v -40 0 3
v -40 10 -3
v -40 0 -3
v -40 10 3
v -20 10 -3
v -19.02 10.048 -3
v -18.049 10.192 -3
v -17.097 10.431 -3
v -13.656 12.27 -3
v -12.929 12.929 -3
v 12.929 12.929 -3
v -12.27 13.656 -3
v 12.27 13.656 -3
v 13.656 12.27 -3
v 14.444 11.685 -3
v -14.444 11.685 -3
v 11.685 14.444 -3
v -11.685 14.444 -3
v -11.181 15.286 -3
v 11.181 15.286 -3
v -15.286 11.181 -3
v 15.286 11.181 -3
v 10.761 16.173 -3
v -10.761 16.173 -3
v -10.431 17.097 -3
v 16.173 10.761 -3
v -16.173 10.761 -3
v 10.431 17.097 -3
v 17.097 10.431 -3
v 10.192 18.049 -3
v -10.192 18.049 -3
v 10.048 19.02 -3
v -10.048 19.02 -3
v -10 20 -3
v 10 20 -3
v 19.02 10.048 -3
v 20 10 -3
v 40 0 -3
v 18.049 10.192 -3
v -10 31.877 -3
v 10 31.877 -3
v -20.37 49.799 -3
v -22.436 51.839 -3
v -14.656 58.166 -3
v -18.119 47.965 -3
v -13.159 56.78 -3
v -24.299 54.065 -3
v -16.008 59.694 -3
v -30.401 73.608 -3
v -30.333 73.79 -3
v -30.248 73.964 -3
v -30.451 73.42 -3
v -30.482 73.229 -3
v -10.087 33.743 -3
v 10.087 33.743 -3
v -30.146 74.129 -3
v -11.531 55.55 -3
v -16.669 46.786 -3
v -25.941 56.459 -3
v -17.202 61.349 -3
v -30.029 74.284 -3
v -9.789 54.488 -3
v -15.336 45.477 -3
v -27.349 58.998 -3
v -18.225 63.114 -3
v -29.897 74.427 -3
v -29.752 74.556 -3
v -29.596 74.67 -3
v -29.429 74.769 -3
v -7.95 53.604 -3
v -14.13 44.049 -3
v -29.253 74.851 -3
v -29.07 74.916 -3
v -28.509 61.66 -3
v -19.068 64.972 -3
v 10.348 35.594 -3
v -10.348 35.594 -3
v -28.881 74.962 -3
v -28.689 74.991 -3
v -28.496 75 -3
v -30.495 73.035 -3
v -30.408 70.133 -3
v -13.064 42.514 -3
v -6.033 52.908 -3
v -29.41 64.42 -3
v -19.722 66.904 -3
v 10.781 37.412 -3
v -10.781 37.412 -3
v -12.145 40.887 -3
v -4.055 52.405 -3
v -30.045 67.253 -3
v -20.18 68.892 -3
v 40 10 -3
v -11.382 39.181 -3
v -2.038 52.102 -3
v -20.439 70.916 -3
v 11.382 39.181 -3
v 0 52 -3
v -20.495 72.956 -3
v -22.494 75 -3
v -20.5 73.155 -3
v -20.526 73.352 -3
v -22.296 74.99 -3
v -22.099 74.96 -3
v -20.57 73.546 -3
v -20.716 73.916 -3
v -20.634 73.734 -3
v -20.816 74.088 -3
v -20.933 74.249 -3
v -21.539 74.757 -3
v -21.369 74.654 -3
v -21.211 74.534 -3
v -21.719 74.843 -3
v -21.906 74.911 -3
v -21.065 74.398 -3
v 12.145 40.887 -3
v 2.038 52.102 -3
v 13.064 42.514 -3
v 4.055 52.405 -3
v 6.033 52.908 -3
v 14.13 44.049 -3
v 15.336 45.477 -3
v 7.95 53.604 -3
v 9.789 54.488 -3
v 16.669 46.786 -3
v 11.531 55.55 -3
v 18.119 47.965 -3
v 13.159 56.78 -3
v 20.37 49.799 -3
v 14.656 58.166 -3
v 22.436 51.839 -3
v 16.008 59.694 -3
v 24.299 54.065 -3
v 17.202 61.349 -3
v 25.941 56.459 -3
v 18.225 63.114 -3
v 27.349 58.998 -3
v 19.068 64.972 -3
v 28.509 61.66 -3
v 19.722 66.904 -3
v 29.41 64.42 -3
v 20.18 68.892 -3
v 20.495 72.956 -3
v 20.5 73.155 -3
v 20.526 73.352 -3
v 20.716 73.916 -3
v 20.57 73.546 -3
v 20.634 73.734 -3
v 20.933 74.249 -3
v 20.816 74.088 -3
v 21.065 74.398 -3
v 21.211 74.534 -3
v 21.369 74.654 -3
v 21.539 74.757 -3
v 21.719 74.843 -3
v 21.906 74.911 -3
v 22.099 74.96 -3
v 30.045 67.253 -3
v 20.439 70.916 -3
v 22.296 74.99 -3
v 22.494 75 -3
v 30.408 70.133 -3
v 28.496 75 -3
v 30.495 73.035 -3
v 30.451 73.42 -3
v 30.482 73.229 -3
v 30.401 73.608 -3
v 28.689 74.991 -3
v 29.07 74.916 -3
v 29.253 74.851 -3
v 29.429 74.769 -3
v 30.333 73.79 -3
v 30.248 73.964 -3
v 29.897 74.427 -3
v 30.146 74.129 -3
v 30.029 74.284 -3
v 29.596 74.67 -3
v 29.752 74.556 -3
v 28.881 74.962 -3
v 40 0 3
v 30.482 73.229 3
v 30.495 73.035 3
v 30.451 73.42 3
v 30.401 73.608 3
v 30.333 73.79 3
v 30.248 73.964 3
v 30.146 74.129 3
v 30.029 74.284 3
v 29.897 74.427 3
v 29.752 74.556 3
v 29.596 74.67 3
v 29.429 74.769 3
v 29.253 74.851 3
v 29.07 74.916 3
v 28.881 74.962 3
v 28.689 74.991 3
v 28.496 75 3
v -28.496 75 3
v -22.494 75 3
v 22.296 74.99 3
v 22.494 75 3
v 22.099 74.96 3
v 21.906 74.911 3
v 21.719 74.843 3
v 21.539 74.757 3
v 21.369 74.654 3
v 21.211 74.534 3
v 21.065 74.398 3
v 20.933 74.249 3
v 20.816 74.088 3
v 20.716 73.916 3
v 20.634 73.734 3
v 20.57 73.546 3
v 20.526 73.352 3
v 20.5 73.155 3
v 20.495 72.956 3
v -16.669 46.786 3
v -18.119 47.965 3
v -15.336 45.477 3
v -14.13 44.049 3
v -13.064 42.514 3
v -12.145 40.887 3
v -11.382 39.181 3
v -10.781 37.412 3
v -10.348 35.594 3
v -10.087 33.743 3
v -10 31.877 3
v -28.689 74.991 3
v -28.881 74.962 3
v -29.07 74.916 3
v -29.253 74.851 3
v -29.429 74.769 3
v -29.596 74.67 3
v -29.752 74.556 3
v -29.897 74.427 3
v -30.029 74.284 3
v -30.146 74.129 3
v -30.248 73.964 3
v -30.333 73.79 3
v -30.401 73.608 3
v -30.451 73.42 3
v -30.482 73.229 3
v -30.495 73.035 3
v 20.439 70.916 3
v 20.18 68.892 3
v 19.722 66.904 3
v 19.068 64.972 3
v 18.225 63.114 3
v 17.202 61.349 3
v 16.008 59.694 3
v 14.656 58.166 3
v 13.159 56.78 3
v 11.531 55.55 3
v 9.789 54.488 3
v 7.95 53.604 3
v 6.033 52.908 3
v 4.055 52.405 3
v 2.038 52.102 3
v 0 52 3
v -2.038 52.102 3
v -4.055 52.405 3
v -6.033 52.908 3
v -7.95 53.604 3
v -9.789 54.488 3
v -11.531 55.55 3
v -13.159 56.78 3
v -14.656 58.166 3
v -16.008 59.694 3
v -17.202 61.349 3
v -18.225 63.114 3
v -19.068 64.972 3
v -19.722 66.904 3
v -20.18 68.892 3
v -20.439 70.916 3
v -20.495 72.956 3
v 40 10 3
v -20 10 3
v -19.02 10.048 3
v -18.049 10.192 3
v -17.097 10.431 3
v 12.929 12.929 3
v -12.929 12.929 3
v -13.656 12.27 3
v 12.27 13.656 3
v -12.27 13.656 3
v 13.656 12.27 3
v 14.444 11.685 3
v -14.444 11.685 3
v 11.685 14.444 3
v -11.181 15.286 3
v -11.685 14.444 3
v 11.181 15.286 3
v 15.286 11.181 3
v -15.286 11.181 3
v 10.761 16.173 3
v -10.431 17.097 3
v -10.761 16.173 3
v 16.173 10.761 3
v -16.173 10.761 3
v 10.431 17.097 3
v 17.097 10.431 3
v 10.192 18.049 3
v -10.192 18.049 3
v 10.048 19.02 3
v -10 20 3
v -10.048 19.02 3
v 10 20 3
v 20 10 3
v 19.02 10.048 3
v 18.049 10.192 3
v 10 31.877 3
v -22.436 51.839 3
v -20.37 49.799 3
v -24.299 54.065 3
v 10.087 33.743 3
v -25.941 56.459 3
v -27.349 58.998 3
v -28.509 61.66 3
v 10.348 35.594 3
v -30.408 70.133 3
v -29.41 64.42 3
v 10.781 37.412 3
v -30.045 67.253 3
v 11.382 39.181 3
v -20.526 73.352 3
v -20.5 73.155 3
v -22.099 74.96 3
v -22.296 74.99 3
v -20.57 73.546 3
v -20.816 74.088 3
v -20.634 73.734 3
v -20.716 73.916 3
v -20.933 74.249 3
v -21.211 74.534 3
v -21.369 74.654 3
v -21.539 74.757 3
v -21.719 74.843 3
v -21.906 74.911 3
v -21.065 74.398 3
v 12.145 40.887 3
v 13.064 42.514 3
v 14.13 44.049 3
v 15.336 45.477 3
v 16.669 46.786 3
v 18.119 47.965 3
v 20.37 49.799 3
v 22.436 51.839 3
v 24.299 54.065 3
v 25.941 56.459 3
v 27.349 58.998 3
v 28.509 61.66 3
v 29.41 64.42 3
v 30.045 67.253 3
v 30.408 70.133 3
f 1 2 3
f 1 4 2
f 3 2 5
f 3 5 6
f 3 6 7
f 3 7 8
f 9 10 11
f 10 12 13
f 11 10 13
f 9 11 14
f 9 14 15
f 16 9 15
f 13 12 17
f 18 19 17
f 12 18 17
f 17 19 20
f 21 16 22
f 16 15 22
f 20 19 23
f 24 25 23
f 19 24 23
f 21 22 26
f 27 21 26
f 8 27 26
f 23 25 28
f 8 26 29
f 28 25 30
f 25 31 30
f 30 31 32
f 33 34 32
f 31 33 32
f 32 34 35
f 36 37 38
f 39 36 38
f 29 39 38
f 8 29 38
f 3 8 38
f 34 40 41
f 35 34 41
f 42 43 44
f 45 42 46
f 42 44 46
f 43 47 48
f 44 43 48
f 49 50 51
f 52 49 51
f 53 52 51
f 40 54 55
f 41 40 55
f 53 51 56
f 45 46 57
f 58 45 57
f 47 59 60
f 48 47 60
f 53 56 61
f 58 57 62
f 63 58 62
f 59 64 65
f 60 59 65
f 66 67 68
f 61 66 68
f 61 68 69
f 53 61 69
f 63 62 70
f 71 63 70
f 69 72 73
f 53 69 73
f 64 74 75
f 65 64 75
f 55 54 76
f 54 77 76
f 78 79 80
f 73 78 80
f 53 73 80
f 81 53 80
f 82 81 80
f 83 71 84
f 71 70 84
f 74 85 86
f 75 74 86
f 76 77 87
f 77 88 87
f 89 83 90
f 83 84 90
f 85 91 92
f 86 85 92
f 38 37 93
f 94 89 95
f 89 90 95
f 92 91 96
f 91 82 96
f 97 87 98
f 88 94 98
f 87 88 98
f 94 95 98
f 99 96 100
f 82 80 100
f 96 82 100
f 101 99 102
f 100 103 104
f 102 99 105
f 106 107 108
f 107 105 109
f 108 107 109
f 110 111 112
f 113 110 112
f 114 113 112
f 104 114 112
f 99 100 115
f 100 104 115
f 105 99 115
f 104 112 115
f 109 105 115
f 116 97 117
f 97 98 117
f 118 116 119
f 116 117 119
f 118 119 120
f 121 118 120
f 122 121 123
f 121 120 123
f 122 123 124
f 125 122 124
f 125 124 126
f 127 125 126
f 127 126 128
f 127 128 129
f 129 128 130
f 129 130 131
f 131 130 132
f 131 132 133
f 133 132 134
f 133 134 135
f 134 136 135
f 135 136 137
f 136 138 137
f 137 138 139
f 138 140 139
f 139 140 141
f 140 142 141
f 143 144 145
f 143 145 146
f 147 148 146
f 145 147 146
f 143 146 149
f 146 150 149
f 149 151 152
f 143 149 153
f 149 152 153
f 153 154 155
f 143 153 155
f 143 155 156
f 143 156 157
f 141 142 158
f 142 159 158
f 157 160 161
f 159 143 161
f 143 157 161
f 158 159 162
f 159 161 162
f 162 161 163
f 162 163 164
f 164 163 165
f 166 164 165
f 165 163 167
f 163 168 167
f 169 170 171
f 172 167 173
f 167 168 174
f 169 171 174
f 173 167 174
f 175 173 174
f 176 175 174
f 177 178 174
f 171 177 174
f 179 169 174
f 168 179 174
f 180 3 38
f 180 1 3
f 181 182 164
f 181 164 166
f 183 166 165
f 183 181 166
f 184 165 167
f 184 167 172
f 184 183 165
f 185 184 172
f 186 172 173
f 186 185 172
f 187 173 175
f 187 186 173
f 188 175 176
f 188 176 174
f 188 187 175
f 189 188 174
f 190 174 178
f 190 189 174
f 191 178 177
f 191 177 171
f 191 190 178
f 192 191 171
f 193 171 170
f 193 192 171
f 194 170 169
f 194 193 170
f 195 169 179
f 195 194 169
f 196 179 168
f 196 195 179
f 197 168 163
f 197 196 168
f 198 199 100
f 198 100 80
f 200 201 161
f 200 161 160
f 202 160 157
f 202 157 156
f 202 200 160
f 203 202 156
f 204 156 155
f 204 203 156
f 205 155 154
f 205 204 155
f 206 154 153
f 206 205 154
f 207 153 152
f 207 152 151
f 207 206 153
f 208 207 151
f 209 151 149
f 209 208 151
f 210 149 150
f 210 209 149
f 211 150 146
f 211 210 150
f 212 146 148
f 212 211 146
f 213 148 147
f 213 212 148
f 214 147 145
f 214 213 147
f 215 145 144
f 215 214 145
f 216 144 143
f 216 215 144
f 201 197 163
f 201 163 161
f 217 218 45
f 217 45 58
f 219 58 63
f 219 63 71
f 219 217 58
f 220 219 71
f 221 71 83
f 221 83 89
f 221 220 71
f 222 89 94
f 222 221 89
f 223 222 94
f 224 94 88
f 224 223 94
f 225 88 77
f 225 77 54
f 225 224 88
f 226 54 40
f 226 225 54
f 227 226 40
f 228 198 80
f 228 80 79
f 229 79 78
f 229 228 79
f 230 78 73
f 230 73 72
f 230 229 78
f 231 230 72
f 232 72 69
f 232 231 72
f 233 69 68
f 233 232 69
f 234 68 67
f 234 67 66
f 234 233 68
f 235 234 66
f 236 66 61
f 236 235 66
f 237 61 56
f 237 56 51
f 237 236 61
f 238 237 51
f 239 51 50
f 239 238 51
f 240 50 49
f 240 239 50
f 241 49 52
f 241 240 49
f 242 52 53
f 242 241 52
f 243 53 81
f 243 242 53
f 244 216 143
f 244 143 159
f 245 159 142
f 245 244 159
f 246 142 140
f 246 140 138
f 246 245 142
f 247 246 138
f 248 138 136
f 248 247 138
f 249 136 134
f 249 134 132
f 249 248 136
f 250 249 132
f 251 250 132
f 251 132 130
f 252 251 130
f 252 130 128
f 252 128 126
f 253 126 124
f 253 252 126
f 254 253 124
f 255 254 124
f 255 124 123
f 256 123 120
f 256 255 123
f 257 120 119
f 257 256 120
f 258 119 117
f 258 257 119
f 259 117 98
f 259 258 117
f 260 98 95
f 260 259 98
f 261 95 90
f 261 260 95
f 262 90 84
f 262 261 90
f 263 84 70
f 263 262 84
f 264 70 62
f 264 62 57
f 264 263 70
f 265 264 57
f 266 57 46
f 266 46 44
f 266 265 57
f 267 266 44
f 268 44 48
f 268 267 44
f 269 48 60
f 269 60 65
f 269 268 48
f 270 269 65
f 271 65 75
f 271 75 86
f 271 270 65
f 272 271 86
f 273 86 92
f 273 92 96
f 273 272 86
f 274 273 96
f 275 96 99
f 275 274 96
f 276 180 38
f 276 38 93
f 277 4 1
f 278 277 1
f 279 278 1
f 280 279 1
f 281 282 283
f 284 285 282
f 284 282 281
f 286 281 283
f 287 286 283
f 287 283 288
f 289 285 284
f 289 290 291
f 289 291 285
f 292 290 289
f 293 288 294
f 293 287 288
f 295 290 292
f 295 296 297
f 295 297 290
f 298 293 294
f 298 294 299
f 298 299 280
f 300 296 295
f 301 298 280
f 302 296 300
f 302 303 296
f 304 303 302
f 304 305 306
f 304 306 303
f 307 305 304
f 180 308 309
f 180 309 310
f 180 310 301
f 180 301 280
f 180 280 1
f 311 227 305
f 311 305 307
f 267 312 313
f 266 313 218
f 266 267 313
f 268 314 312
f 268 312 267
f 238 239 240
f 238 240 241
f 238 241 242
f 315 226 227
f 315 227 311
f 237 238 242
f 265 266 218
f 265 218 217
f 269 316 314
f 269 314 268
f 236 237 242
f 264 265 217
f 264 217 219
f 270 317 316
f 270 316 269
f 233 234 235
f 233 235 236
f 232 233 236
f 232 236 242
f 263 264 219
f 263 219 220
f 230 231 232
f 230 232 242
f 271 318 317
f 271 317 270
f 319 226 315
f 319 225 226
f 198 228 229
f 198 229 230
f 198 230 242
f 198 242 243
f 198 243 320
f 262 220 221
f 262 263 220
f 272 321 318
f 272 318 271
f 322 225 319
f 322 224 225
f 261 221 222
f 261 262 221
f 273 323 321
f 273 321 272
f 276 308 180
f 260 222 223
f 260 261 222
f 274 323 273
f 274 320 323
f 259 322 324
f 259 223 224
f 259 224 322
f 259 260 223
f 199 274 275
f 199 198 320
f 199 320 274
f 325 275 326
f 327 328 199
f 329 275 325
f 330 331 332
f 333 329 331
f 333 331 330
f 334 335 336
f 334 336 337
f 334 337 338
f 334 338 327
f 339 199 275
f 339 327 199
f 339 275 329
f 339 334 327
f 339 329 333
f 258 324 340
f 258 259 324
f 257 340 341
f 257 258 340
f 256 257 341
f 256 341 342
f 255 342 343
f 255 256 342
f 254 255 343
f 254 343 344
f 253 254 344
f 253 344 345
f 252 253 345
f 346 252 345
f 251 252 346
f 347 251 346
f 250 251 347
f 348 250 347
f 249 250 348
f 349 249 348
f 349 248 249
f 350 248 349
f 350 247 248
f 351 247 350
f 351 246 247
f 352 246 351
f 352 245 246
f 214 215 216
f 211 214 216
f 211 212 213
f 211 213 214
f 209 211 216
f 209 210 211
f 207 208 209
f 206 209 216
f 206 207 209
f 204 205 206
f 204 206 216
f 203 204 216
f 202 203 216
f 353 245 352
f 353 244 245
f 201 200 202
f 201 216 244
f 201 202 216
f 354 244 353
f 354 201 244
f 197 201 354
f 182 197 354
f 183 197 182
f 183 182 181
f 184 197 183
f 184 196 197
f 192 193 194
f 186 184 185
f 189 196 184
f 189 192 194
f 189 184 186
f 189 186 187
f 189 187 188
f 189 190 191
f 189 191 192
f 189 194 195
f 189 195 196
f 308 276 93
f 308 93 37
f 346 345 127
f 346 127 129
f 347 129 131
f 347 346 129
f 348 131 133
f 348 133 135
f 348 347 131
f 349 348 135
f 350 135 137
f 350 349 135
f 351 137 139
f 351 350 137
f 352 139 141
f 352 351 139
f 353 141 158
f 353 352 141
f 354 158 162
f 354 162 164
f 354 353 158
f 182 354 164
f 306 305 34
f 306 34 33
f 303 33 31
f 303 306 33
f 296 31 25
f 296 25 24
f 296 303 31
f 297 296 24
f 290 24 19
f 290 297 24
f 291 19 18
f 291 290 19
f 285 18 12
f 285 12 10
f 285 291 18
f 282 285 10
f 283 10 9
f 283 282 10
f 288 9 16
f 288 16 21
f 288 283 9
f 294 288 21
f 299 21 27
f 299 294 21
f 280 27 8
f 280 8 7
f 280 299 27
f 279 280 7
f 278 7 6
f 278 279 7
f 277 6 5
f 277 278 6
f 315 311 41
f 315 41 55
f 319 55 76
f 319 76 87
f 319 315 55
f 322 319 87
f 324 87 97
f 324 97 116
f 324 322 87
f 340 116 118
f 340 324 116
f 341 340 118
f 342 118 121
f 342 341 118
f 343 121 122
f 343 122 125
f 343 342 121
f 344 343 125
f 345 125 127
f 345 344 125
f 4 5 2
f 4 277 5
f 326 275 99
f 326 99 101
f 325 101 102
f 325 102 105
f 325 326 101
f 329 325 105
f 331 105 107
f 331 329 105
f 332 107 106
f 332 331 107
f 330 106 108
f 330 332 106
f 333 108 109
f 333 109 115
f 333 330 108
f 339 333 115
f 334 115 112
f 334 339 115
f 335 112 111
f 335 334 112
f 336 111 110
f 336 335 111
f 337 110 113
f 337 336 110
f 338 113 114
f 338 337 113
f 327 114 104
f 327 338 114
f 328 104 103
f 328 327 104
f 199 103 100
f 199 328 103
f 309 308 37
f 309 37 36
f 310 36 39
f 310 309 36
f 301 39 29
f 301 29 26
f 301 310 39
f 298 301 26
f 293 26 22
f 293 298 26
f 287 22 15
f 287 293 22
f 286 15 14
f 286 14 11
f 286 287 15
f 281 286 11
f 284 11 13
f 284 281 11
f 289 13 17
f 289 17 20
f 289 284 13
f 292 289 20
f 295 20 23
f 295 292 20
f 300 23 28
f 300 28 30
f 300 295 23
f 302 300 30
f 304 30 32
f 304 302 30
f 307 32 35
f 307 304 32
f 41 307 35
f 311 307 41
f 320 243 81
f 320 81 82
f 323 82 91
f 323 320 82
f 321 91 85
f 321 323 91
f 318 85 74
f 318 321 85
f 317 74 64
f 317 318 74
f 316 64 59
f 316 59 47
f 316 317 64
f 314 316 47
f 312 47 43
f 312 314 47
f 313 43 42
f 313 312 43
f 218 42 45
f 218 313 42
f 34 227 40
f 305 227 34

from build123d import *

# Parameters (mm, degrees)
BOSS_EXTRU_1_DEPTH = 3


with BuildPart() as part:
    # Esquisse1 → Boss.-Extru.1 (new body, symmetric)
    with BuildSketch(Plane.XY):
        with BuildLine():
            Line((-40, 0), (40, 0))
            Line((40, 0), (40, 10))
            Line((40, 10), (20, 10))
            ThreePointArc((20, 10), (12.928932188, 12.928932188), (10, 20))
            Line((10, 20), (10, 31.876730806))
            ThreePointArc((10, 31.876730806), (12.144695993, 40.88717579), (18.118811881, 47.965154249))
            ThreePointArc((18.118811881, 47.965154249), (27.348830005, 58.998463148), (30.495305887, 73.035087719))
            ThreePointArc((30.495305887, 73.035087719), (29.897366986, 74.426565007), (28.495613698, 75))
            Line((28.495613698, 75), (22.494443758, 75))
            ThreePointArc((22.494443758, 75), (21.064603052, 74.398411798), (20.494937647, 72.955555556))
            ThreePointArc((20.494937647, 72.955555556), (0, 52), (-20.494937647, 72.955555556))
            ThreePointArc((-20.494937647, 72.955555556), (-21.064603052, 74.398411798), (-22.494443758, 75))
            Line((-22.494443758, 75), (-28.495613698, 75))
            ThreePointArc((-28.495613698, 75), (-29.897366986, 74.426565007), (-30.495305887, 73.035087719))
            ThreePointArc((-30.495305887, 73.035087719), (-27.348830005, 58.998463148), (-18.118811881, 47.965154249))
            ThreePointArc((-18.118811881, 47.965154249), (-12.144695993, 40.88717579), (-10, 31.876730806))
            Line((-10, 31.876730806), (-10, 20))
            ThreePointArc((-10, 20), (-12.928932188, 12.928932188), (-20, 10))
            Line((-20, 10), (-40, 10))
            Line((-40, 10), (-40, 0))
        make_face()
    extrude(amount=BOSS_EXTRU_1_DEPTH, both=True)


solid = part.part
